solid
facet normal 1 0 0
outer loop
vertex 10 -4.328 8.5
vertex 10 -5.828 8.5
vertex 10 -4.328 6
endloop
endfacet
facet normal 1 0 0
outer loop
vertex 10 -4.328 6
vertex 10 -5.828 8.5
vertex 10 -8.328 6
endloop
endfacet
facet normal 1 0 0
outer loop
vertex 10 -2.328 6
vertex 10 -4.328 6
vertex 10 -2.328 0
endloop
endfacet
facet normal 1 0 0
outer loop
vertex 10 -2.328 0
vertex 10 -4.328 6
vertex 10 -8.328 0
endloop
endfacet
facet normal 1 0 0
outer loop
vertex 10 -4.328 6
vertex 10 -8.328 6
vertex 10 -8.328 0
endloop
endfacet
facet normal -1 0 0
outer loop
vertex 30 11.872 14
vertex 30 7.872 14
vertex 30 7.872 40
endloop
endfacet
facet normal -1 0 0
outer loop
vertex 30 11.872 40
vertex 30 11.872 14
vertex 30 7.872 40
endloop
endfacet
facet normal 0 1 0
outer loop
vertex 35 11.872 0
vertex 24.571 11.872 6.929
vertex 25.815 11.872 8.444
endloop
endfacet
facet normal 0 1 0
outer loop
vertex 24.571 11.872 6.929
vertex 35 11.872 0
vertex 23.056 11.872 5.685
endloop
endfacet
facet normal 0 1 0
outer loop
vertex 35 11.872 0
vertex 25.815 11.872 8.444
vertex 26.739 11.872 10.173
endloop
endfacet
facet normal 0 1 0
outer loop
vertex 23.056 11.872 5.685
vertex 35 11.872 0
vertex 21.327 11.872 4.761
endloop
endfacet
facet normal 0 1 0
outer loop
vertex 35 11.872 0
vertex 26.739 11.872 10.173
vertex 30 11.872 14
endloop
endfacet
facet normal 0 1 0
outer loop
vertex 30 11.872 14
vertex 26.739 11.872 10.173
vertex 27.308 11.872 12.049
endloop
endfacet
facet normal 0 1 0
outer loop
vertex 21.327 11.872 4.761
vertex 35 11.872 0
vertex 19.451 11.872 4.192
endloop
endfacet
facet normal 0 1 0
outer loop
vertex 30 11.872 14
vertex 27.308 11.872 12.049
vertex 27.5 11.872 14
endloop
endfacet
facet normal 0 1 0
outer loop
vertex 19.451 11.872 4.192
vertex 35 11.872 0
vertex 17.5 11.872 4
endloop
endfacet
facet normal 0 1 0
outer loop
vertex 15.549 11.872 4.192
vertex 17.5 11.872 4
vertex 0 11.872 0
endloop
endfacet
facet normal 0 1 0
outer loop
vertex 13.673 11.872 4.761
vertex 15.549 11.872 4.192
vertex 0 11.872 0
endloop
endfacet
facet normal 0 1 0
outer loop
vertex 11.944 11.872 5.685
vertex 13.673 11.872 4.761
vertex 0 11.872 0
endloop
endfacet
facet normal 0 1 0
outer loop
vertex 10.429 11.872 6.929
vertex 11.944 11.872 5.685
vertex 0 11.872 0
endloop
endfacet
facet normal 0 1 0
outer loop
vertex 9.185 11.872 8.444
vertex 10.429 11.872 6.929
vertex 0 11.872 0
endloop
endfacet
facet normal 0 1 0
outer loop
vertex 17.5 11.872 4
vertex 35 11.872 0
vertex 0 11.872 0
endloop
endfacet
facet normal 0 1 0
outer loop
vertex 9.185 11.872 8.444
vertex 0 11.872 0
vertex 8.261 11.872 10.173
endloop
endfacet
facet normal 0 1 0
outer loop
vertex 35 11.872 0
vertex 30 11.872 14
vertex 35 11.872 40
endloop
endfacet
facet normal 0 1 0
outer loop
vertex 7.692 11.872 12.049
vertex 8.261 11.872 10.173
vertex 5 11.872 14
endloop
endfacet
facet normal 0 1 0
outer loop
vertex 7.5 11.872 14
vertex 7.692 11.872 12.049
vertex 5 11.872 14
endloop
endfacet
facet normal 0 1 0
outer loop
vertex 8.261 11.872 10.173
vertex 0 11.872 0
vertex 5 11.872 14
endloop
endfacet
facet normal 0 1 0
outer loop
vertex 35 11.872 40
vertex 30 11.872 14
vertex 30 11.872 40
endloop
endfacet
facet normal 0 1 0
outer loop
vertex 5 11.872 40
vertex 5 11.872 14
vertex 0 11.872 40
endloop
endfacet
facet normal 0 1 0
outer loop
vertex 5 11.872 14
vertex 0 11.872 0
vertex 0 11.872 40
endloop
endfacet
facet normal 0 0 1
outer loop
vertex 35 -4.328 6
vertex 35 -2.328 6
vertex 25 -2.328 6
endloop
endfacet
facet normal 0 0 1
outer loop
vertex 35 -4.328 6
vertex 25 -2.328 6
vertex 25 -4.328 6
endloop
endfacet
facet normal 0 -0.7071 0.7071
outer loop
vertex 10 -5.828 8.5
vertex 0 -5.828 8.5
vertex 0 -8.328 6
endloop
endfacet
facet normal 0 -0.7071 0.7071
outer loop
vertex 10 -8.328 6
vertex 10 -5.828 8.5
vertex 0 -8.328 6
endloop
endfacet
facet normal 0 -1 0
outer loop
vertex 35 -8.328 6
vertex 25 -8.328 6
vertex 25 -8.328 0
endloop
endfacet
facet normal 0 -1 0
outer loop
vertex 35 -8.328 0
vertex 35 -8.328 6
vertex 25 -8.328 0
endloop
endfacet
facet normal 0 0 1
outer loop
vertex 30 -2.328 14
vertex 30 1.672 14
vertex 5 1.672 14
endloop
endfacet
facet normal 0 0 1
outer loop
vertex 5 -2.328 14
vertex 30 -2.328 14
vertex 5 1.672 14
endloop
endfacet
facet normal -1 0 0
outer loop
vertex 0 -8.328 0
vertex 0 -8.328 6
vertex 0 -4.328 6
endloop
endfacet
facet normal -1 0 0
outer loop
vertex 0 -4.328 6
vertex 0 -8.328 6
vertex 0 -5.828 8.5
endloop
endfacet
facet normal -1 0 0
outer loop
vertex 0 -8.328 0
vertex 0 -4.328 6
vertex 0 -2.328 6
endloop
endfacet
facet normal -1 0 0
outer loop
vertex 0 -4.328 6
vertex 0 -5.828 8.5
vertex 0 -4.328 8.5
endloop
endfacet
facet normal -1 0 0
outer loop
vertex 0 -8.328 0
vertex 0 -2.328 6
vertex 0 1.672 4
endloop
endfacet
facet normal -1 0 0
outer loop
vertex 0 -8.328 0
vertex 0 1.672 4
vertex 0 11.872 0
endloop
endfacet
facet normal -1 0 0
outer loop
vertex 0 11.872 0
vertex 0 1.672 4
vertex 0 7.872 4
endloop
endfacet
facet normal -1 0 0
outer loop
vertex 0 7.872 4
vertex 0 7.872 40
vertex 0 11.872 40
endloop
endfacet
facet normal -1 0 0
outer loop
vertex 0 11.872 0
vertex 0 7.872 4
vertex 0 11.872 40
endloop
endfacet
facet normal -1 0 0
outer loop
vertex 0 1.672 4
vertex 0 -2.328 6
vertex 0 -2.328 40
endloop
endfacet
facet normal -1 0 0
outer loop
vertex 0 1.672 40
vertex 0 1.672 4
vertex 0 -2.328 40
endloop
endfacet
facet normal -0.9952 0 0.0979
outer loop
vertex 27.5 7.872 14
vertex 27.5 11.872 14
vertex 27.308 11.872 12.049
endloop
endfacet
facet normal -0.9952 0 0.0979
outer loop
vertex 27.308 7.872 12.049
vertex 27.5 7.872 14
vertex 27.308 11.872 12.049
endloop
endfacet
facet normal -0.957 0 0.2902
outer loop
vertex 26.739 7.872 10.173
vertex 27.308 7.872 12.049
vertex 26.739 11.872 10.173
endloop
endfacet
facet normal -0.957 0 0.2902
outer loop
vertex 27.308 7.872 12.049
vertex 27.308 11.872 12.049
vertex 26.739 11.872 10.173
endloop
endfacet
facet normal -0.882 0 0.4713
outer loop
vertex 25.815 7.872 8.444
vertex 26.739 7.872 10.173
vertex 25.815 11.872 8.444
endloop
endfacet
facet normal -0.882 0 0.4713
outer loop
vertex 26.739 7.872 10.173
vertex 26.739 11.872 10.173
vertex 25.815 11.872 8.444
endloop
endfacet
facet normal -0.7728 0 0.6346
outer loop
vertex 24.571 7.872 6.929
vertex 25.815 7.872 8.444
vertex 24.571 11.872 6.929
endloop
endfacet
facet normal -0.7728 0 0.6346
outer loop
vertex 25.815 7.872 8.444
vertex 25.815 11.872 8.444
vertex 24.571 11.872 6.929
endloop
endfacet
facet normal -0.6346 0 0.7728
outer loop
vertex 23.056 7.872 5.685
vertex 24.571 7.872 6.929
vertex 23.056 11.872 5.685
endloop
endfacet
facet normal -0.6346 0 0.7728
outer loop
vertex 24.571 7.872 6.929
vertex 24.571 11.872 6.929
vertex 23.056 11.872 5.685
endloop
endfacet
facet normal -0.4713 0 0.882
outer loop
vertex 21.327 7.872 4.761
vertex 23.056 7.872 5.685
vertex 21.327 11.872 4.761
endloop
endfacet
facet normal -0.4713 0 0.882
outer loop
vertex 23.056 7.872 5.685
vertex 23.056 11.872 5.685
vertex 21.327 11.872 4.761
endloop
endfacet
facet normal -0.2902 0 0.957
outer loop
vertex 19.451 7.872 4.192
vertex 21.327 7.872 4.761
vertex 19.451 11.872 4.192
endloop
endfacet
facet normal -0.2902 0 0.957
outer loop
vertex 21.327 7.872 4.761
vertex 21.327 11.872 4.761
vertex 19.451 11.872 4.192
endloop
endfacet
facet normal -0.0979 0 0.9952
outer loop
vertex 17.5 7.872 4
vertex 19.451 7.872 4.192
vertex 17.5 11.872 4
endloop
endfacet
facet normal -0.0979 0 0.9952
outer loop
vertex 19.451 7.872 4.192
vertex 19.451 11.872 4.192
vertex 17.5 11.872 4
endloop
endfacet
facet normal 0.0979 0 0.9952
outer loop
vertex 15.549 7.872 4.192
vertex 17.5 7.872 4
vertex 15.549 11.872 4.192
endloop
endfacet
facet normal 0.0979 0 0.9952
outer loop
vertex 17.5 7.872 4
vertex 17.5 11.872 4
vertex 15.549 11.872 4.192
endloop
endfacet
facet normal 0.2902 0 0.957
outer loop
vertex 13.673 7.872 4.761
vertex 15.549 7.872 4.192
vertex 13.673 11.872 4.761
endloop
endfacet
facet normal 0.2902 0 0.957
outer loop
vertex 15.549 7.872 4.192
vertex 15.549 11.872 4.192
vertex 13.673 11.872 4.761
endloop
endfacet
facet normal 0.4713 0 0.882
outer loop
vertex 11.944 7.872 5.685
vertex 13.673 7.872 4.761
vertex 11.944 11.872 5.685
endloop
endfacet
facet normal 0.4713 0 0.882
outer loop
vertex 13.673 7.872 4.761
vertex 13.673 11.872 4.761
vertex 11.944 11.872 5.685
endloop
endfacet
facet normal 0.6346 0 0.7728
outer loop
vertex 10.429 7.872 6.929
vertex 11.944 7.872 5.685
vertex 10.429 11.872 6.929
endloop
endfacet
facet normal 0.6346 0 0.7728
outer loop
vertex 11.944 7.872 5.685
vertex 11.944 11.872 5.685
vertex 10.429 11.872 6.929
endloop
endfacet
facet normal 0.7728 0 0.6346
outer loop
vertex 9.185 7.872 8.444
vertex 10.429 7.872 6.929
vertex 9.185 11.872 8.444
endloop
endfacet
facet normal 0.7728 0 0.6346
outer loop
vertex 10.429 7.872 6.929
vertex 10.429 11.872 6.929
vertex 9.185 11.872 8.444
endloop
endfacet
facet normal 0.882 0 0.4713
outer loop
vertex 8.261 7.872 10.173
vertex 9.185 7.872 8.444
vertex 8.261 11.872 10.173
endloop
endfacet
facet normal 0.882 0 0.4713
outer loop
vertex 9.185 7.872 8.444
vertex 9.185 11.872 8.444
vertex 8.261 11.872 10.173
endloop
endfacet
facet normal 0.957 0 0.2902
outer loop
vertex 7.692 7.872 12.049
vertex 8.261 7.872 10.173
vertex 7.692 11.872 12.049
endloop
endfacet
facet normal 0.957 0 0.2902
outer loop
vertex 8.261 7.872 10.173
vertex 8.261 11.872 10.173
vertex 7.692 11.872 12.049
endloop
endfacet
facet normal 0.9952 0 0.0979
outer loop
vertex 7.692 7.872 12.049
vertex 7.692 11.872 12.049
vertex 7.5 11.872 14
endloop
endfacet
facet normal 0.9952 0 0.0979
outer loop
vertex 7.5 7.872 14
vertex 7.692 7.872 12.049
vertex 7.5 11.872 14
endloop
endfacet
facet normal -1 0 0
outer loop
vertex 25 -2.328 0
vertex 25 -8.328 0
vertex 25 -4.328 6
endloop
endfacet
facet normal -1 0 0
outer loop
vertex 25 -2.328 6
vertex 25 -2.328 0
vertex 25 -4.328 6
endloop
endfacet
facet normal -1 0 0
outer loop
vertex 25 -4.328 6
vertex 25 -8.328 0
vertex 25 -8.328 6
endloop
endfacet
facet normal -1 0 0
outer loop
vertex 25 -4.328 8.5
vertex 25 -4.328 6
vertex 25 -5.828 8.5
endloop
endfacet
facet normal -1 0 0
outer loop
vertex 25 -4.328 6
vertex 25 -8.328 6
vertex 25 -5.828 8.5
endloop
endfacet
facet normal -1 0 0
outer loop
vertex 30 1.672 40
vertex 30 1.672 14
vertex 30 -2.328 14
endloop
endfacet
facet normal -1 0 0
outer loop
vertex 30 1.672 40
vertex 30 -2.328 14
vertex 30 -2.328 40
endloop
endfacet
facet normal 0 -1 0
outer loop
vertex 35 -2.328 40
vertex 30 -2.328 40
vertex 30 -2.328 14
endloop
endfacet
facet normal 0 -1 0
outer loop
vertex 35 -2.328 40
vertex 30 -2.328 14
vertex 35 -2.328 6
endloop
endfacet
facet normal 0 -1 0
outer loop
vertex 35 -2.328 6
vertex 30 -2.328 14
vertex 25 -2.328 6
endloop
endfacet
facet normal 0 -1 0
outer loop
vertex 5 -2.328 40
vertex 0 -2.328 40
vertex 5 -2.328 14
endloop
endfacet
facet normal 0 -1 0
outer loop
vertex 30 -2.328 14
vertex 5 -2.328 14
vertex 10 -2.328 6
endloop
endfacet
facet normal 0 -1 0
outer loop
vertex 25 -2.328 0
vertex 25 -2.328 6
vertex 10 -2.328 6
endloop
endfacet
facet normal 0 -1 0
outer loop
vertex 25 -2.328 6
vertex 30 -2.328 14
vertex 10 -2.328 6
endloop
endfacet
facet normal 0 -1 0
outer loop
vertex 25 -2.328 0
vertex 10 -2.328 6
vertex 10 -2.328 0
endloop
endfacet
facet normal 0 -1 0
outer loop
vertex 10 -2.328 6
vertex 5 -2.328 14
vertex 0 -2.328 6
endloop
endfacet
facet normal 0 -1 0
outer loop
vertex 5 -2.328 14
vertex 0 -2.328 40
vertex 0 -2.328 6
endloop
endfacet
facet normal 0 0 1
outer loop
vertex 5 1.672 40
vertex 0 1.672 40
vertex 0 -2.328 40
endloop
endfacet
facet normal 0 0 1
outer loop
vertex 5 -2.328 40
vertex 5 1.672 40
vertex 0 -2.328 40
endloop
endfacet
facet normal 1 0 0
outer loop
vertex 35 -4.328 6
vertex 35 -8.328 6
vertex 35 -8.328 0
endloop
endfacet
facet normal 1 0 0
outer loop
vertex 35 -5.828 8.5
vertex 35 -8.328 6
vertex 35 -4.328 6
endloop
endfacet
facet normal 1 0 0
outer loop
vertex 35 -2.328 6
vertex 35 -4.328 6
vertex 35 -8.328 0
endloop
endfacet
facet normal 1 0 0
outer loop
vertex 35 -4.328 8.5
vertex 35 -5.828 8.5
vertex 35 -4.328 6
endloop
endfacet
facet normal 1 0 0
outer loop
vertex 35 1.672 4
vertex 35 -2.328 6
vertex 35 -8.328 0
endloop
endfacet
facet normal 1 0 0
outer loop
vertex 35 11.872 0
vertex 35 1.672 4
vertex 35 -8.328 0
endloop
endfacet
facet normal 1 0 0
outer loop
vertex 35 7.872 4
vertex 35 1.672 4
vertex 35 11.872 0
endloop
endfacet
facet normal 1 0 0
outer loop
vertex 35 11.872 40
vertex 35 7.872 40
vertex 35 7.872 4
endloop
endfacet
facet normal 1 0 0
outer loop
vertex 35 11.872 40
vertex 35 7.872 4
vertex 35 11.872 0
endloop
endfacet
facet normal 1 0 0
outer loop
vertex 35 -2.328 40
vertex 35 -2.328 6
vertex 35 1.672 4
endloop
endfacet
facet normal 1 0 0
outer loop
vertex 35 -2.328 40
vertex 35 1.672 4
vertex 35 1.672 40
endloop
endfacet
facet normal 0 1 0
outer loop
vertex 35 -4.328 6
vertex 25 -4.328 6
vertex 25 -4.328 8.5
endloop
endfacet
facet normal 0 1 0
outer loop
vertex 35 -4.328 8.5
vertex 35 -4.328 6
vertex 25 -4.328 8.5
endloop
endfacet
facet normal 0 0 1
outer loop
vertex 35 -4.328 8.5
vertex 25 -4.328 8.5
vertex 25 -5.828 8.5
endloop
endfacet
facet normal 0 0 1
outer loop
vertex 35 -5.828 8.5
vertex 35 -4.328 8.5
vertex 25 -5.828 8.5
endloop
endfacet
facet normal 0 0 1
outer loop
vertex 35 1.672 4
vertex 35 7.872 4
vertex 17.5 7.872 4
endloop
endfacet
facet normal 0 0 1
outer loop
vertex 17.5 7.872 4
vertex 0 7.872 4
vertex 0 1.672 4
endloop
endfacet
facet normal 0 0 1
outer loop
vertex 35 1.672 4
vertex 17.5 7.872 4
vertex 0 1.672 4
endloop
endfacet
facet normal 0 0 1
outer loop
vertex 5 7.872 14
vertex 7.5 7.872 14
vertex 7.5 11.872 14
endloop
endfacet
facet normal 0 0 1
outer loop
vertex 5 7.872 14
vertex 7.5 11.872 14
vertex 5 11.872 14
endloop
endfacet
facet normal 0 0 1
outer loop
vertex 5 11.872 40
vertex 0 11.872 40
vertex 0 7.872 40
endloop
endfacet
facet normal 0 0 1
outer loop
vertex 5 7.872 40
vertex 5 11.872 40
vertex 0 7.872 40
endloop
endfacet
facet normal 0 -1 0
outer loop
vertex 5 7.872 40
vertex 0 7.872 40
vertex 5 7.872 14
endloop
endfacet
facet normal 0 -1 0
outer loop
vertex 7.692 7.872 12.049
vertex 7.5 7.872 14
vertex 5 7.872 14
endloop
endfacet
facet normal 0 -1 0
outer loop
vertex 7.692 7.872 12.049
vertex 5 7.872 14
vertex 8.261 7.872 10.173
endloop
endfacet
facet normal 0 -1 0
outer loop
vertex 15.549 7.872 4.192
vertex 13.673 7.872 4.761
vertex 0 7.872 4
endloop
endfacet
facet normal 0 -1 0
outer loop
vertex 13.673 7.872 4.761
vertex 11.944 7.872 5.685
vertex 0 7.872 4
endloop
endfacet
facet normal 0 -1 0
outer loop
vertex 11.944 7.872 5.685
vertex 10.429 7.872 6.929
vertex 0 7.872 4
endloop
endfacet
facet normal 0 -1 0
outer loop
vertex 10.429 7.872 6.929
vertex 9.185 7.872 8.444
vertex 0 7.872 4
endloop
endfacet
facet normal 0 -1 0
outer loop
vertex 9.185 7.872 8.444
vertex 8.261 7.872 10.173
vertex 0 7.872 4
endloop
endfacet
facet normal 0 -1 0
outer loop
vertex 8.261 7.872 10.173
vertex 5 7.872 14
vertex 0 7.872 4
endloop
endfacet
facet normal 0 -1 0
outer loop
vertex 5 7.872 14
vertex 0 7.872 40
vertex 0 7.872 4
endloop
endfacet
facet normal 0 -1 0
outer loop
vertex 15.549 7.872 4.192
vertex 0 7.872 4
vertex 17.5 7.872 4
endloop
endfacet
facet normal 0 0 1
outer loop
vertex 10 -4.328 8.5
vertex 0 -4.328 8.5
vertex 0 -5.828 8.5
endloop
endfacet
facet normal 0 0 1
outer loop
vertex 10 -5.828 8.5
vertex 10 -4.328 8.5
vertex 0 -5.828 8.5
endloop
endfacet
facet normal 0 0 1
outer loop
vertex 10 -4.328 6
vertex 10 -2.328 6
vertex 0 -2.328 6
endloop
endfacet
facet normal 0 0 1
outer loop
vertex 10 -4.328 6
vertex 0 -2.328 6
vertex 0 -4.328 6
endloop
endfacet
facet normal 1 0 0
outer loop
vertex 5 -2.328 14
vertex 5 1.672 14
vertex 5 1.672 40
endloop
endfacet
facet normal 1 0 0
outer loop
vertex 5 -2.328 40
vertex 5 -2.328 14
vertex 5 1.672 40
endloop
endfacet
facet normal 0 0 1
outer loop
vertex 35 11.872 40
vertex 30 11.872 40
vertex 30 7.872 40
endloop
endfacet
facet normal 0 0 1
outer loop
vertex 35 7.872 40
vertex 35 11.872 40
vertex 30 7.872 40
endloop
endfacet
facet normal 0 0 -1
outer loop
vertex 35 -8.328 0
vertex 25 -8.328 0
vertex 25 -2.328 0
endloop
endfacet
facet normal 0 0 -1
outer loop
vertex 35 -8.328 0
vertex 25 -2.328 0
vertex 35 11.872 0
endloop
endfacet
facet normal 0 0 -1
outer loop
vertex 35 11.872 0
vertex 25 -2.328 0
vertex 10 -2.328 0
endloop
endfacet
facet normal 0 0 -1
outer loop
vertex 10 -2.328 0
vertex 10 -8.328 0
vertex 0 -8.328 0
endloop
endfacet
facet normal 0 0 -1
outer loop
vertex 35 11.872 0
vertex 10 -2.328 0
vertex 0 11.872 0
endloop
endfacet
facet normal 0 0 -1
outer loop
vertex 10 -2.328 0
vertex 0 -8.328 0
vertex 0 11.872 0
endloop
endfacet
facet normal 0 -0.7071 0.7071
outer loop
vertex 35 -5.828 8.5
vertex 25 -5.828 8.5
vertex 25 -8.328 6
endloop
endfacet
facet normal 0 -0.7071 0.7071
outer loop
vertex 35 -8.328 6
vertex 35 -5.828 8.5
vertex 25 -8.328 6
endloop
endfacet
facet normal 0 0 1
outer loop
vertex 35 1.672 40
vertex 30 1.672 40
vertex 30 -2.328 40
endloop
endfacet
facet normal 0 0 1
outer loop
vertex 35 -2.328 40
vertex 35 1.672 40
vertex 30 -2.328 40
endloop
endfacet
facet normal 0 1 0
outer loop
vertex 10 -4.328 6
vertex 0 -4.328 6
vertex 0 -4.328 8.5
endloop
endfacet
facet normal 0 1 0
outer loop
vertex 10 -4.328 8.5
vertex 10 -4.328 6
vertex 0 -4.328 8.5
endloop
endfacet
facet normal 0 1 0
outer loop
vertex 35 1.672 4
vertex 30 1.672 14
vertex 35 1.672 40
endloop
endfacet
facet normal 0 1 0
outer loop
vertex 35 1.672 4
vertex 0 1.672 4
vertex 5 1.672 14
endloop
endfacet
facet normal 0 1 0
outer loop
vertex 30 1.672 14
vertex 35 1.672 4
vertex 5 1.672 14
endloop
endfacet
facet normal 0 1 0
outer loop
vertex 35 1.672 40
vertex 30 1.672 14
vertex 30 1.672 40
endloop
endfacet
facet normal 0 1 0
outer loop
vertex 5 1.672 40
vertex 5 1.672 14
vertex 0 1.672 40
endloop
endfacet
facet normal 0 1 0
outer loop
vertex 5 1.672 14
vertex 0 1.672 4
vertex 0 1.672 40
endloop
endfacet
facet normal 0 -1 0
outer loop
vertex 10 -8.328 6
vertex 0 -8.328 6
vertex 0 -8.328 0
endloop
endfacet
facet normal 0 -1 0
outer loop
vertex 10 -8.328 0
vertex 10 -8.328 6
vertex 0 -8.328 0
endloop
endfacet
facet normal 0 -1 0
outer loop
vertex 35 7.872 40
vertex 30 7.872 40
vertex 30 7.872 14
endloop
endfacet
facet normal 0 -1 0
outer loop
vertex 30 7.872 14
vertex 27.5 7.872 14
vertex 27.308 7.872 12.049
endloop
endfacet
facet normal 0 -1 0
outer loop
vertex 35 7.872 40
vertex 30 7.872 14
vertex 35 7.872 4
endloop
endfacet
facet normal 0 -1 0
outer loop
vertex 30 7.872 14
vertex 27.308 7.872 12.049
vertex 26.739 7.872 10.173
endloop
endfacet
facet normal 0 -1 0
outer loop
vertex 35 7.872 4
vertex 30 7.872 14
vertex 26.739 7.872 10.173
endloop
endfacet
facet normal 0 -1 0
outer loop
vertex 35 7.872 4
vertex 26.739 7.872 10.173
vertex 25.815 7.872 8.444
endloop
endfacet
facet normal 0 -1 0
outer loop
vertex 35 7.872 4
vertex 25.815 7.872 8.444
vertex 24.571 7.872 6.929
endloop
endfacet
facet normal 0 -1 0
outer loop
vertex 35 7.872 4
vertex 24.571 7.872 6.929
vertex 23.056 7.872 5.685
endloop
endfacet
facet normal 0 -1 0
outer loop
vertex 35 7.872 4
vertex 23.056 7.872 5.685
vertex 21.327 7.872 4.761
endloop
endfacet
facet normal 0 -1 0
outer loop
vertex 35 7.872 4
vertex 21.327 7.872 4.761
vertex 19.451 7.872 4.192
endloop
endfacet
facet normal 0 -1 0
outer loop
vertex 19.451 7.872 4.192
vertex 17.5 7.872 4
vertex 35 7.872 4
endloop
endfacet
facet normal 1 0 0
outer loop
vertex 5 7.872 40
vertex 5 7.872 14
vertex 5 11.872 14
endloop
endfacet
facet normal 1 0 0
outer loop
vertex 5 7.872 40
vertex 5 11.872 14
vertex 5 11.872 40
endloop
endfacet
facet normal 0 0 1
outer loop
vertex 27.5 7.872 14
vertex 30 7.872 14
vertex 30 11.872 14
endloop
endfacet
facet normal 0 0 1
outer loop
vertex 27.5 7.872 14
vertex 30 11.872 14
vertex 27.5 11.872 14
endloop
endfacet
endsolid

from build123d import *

# Parameters (mm, degrees)
F1_DEPTH      = 35
F2_W          = 25
F2_H          = 26
F3_DEPTH      = 10.001
F3_DEPTH_BACK = 10.201
F4_W          = 15
F4_H          = 6
F4_H_2        = 2.5
F5_DEPTH      = 6
F6_R          = 10
F7_DEPTH      = 4


with BuildPart() as f1:
    # F0 (on Right) → F1 (new body)
    with BuildSketch(Plane.YZ):
        Polygon((1.6723675691, 40), (-2.3276324309, 40), (-2.3276324309, 6), (-2.3276324309, 0), (11.8723675691, 0), (11.8723675691, 40), (7.8723675691, 40), (7.8723675691, 4), (1.6723675691, 4), align=None)
        Polygon((-2.3276324309, 0), (-2.3276324309, 6), (-4.3276324309, 6), (-4.3276324309, 8.5), (-5.8276324309, 8.5), (-8.3276324309, 6), (-8.3276324309, 0), align=None)
    extrude(amount=F1_DEPTH)

    # F2 (on face) → F3 (cut, two sides)
    with BuildSketch(Plane(origin=(0, 1.6723675691, 0), x_dir=(-1, 0, 0), z_dir=(0, 1, 0))) as f3_sk:
        with Locations((-17.5, 27)):
            Rectangle(F2_W, F2_H)
    extrude(amount=-F3_DEPTH, mode=Mode.SUBTRACT)
    extrude(f3_sk.sketch, amount=F3_DEPTH_BACK, mode=Mode.SUBTRACT)

    # F4 (on face) → F5 (cut, through all)
    with BuildSketch(Plane.XZ.offset(8.3276324309)):
        with Locations((17.5, 3)):
            Rectangle(F4_W, F4_H)
        with Locations((17.5, 7.25)):
            Rectangle(F4_W, F4_H_2)
    extrude(amount=-F5_DEPTH, mode=Mode.SUBTRACT)

    # F6 (on face) → F7 (cut, through all)
    with BuildSketch(Plane(origin=(0, 11.8723675691, 0), x_dir=(-1, 0, 0), z_dir=(0, 1, 0))):
        with Locations((-17.5, 14)):
            Circle(F6_R)
    extrude(amount=-F7_DEPTH, mode=Mode.SUBTRACT)


solid = f1.part
